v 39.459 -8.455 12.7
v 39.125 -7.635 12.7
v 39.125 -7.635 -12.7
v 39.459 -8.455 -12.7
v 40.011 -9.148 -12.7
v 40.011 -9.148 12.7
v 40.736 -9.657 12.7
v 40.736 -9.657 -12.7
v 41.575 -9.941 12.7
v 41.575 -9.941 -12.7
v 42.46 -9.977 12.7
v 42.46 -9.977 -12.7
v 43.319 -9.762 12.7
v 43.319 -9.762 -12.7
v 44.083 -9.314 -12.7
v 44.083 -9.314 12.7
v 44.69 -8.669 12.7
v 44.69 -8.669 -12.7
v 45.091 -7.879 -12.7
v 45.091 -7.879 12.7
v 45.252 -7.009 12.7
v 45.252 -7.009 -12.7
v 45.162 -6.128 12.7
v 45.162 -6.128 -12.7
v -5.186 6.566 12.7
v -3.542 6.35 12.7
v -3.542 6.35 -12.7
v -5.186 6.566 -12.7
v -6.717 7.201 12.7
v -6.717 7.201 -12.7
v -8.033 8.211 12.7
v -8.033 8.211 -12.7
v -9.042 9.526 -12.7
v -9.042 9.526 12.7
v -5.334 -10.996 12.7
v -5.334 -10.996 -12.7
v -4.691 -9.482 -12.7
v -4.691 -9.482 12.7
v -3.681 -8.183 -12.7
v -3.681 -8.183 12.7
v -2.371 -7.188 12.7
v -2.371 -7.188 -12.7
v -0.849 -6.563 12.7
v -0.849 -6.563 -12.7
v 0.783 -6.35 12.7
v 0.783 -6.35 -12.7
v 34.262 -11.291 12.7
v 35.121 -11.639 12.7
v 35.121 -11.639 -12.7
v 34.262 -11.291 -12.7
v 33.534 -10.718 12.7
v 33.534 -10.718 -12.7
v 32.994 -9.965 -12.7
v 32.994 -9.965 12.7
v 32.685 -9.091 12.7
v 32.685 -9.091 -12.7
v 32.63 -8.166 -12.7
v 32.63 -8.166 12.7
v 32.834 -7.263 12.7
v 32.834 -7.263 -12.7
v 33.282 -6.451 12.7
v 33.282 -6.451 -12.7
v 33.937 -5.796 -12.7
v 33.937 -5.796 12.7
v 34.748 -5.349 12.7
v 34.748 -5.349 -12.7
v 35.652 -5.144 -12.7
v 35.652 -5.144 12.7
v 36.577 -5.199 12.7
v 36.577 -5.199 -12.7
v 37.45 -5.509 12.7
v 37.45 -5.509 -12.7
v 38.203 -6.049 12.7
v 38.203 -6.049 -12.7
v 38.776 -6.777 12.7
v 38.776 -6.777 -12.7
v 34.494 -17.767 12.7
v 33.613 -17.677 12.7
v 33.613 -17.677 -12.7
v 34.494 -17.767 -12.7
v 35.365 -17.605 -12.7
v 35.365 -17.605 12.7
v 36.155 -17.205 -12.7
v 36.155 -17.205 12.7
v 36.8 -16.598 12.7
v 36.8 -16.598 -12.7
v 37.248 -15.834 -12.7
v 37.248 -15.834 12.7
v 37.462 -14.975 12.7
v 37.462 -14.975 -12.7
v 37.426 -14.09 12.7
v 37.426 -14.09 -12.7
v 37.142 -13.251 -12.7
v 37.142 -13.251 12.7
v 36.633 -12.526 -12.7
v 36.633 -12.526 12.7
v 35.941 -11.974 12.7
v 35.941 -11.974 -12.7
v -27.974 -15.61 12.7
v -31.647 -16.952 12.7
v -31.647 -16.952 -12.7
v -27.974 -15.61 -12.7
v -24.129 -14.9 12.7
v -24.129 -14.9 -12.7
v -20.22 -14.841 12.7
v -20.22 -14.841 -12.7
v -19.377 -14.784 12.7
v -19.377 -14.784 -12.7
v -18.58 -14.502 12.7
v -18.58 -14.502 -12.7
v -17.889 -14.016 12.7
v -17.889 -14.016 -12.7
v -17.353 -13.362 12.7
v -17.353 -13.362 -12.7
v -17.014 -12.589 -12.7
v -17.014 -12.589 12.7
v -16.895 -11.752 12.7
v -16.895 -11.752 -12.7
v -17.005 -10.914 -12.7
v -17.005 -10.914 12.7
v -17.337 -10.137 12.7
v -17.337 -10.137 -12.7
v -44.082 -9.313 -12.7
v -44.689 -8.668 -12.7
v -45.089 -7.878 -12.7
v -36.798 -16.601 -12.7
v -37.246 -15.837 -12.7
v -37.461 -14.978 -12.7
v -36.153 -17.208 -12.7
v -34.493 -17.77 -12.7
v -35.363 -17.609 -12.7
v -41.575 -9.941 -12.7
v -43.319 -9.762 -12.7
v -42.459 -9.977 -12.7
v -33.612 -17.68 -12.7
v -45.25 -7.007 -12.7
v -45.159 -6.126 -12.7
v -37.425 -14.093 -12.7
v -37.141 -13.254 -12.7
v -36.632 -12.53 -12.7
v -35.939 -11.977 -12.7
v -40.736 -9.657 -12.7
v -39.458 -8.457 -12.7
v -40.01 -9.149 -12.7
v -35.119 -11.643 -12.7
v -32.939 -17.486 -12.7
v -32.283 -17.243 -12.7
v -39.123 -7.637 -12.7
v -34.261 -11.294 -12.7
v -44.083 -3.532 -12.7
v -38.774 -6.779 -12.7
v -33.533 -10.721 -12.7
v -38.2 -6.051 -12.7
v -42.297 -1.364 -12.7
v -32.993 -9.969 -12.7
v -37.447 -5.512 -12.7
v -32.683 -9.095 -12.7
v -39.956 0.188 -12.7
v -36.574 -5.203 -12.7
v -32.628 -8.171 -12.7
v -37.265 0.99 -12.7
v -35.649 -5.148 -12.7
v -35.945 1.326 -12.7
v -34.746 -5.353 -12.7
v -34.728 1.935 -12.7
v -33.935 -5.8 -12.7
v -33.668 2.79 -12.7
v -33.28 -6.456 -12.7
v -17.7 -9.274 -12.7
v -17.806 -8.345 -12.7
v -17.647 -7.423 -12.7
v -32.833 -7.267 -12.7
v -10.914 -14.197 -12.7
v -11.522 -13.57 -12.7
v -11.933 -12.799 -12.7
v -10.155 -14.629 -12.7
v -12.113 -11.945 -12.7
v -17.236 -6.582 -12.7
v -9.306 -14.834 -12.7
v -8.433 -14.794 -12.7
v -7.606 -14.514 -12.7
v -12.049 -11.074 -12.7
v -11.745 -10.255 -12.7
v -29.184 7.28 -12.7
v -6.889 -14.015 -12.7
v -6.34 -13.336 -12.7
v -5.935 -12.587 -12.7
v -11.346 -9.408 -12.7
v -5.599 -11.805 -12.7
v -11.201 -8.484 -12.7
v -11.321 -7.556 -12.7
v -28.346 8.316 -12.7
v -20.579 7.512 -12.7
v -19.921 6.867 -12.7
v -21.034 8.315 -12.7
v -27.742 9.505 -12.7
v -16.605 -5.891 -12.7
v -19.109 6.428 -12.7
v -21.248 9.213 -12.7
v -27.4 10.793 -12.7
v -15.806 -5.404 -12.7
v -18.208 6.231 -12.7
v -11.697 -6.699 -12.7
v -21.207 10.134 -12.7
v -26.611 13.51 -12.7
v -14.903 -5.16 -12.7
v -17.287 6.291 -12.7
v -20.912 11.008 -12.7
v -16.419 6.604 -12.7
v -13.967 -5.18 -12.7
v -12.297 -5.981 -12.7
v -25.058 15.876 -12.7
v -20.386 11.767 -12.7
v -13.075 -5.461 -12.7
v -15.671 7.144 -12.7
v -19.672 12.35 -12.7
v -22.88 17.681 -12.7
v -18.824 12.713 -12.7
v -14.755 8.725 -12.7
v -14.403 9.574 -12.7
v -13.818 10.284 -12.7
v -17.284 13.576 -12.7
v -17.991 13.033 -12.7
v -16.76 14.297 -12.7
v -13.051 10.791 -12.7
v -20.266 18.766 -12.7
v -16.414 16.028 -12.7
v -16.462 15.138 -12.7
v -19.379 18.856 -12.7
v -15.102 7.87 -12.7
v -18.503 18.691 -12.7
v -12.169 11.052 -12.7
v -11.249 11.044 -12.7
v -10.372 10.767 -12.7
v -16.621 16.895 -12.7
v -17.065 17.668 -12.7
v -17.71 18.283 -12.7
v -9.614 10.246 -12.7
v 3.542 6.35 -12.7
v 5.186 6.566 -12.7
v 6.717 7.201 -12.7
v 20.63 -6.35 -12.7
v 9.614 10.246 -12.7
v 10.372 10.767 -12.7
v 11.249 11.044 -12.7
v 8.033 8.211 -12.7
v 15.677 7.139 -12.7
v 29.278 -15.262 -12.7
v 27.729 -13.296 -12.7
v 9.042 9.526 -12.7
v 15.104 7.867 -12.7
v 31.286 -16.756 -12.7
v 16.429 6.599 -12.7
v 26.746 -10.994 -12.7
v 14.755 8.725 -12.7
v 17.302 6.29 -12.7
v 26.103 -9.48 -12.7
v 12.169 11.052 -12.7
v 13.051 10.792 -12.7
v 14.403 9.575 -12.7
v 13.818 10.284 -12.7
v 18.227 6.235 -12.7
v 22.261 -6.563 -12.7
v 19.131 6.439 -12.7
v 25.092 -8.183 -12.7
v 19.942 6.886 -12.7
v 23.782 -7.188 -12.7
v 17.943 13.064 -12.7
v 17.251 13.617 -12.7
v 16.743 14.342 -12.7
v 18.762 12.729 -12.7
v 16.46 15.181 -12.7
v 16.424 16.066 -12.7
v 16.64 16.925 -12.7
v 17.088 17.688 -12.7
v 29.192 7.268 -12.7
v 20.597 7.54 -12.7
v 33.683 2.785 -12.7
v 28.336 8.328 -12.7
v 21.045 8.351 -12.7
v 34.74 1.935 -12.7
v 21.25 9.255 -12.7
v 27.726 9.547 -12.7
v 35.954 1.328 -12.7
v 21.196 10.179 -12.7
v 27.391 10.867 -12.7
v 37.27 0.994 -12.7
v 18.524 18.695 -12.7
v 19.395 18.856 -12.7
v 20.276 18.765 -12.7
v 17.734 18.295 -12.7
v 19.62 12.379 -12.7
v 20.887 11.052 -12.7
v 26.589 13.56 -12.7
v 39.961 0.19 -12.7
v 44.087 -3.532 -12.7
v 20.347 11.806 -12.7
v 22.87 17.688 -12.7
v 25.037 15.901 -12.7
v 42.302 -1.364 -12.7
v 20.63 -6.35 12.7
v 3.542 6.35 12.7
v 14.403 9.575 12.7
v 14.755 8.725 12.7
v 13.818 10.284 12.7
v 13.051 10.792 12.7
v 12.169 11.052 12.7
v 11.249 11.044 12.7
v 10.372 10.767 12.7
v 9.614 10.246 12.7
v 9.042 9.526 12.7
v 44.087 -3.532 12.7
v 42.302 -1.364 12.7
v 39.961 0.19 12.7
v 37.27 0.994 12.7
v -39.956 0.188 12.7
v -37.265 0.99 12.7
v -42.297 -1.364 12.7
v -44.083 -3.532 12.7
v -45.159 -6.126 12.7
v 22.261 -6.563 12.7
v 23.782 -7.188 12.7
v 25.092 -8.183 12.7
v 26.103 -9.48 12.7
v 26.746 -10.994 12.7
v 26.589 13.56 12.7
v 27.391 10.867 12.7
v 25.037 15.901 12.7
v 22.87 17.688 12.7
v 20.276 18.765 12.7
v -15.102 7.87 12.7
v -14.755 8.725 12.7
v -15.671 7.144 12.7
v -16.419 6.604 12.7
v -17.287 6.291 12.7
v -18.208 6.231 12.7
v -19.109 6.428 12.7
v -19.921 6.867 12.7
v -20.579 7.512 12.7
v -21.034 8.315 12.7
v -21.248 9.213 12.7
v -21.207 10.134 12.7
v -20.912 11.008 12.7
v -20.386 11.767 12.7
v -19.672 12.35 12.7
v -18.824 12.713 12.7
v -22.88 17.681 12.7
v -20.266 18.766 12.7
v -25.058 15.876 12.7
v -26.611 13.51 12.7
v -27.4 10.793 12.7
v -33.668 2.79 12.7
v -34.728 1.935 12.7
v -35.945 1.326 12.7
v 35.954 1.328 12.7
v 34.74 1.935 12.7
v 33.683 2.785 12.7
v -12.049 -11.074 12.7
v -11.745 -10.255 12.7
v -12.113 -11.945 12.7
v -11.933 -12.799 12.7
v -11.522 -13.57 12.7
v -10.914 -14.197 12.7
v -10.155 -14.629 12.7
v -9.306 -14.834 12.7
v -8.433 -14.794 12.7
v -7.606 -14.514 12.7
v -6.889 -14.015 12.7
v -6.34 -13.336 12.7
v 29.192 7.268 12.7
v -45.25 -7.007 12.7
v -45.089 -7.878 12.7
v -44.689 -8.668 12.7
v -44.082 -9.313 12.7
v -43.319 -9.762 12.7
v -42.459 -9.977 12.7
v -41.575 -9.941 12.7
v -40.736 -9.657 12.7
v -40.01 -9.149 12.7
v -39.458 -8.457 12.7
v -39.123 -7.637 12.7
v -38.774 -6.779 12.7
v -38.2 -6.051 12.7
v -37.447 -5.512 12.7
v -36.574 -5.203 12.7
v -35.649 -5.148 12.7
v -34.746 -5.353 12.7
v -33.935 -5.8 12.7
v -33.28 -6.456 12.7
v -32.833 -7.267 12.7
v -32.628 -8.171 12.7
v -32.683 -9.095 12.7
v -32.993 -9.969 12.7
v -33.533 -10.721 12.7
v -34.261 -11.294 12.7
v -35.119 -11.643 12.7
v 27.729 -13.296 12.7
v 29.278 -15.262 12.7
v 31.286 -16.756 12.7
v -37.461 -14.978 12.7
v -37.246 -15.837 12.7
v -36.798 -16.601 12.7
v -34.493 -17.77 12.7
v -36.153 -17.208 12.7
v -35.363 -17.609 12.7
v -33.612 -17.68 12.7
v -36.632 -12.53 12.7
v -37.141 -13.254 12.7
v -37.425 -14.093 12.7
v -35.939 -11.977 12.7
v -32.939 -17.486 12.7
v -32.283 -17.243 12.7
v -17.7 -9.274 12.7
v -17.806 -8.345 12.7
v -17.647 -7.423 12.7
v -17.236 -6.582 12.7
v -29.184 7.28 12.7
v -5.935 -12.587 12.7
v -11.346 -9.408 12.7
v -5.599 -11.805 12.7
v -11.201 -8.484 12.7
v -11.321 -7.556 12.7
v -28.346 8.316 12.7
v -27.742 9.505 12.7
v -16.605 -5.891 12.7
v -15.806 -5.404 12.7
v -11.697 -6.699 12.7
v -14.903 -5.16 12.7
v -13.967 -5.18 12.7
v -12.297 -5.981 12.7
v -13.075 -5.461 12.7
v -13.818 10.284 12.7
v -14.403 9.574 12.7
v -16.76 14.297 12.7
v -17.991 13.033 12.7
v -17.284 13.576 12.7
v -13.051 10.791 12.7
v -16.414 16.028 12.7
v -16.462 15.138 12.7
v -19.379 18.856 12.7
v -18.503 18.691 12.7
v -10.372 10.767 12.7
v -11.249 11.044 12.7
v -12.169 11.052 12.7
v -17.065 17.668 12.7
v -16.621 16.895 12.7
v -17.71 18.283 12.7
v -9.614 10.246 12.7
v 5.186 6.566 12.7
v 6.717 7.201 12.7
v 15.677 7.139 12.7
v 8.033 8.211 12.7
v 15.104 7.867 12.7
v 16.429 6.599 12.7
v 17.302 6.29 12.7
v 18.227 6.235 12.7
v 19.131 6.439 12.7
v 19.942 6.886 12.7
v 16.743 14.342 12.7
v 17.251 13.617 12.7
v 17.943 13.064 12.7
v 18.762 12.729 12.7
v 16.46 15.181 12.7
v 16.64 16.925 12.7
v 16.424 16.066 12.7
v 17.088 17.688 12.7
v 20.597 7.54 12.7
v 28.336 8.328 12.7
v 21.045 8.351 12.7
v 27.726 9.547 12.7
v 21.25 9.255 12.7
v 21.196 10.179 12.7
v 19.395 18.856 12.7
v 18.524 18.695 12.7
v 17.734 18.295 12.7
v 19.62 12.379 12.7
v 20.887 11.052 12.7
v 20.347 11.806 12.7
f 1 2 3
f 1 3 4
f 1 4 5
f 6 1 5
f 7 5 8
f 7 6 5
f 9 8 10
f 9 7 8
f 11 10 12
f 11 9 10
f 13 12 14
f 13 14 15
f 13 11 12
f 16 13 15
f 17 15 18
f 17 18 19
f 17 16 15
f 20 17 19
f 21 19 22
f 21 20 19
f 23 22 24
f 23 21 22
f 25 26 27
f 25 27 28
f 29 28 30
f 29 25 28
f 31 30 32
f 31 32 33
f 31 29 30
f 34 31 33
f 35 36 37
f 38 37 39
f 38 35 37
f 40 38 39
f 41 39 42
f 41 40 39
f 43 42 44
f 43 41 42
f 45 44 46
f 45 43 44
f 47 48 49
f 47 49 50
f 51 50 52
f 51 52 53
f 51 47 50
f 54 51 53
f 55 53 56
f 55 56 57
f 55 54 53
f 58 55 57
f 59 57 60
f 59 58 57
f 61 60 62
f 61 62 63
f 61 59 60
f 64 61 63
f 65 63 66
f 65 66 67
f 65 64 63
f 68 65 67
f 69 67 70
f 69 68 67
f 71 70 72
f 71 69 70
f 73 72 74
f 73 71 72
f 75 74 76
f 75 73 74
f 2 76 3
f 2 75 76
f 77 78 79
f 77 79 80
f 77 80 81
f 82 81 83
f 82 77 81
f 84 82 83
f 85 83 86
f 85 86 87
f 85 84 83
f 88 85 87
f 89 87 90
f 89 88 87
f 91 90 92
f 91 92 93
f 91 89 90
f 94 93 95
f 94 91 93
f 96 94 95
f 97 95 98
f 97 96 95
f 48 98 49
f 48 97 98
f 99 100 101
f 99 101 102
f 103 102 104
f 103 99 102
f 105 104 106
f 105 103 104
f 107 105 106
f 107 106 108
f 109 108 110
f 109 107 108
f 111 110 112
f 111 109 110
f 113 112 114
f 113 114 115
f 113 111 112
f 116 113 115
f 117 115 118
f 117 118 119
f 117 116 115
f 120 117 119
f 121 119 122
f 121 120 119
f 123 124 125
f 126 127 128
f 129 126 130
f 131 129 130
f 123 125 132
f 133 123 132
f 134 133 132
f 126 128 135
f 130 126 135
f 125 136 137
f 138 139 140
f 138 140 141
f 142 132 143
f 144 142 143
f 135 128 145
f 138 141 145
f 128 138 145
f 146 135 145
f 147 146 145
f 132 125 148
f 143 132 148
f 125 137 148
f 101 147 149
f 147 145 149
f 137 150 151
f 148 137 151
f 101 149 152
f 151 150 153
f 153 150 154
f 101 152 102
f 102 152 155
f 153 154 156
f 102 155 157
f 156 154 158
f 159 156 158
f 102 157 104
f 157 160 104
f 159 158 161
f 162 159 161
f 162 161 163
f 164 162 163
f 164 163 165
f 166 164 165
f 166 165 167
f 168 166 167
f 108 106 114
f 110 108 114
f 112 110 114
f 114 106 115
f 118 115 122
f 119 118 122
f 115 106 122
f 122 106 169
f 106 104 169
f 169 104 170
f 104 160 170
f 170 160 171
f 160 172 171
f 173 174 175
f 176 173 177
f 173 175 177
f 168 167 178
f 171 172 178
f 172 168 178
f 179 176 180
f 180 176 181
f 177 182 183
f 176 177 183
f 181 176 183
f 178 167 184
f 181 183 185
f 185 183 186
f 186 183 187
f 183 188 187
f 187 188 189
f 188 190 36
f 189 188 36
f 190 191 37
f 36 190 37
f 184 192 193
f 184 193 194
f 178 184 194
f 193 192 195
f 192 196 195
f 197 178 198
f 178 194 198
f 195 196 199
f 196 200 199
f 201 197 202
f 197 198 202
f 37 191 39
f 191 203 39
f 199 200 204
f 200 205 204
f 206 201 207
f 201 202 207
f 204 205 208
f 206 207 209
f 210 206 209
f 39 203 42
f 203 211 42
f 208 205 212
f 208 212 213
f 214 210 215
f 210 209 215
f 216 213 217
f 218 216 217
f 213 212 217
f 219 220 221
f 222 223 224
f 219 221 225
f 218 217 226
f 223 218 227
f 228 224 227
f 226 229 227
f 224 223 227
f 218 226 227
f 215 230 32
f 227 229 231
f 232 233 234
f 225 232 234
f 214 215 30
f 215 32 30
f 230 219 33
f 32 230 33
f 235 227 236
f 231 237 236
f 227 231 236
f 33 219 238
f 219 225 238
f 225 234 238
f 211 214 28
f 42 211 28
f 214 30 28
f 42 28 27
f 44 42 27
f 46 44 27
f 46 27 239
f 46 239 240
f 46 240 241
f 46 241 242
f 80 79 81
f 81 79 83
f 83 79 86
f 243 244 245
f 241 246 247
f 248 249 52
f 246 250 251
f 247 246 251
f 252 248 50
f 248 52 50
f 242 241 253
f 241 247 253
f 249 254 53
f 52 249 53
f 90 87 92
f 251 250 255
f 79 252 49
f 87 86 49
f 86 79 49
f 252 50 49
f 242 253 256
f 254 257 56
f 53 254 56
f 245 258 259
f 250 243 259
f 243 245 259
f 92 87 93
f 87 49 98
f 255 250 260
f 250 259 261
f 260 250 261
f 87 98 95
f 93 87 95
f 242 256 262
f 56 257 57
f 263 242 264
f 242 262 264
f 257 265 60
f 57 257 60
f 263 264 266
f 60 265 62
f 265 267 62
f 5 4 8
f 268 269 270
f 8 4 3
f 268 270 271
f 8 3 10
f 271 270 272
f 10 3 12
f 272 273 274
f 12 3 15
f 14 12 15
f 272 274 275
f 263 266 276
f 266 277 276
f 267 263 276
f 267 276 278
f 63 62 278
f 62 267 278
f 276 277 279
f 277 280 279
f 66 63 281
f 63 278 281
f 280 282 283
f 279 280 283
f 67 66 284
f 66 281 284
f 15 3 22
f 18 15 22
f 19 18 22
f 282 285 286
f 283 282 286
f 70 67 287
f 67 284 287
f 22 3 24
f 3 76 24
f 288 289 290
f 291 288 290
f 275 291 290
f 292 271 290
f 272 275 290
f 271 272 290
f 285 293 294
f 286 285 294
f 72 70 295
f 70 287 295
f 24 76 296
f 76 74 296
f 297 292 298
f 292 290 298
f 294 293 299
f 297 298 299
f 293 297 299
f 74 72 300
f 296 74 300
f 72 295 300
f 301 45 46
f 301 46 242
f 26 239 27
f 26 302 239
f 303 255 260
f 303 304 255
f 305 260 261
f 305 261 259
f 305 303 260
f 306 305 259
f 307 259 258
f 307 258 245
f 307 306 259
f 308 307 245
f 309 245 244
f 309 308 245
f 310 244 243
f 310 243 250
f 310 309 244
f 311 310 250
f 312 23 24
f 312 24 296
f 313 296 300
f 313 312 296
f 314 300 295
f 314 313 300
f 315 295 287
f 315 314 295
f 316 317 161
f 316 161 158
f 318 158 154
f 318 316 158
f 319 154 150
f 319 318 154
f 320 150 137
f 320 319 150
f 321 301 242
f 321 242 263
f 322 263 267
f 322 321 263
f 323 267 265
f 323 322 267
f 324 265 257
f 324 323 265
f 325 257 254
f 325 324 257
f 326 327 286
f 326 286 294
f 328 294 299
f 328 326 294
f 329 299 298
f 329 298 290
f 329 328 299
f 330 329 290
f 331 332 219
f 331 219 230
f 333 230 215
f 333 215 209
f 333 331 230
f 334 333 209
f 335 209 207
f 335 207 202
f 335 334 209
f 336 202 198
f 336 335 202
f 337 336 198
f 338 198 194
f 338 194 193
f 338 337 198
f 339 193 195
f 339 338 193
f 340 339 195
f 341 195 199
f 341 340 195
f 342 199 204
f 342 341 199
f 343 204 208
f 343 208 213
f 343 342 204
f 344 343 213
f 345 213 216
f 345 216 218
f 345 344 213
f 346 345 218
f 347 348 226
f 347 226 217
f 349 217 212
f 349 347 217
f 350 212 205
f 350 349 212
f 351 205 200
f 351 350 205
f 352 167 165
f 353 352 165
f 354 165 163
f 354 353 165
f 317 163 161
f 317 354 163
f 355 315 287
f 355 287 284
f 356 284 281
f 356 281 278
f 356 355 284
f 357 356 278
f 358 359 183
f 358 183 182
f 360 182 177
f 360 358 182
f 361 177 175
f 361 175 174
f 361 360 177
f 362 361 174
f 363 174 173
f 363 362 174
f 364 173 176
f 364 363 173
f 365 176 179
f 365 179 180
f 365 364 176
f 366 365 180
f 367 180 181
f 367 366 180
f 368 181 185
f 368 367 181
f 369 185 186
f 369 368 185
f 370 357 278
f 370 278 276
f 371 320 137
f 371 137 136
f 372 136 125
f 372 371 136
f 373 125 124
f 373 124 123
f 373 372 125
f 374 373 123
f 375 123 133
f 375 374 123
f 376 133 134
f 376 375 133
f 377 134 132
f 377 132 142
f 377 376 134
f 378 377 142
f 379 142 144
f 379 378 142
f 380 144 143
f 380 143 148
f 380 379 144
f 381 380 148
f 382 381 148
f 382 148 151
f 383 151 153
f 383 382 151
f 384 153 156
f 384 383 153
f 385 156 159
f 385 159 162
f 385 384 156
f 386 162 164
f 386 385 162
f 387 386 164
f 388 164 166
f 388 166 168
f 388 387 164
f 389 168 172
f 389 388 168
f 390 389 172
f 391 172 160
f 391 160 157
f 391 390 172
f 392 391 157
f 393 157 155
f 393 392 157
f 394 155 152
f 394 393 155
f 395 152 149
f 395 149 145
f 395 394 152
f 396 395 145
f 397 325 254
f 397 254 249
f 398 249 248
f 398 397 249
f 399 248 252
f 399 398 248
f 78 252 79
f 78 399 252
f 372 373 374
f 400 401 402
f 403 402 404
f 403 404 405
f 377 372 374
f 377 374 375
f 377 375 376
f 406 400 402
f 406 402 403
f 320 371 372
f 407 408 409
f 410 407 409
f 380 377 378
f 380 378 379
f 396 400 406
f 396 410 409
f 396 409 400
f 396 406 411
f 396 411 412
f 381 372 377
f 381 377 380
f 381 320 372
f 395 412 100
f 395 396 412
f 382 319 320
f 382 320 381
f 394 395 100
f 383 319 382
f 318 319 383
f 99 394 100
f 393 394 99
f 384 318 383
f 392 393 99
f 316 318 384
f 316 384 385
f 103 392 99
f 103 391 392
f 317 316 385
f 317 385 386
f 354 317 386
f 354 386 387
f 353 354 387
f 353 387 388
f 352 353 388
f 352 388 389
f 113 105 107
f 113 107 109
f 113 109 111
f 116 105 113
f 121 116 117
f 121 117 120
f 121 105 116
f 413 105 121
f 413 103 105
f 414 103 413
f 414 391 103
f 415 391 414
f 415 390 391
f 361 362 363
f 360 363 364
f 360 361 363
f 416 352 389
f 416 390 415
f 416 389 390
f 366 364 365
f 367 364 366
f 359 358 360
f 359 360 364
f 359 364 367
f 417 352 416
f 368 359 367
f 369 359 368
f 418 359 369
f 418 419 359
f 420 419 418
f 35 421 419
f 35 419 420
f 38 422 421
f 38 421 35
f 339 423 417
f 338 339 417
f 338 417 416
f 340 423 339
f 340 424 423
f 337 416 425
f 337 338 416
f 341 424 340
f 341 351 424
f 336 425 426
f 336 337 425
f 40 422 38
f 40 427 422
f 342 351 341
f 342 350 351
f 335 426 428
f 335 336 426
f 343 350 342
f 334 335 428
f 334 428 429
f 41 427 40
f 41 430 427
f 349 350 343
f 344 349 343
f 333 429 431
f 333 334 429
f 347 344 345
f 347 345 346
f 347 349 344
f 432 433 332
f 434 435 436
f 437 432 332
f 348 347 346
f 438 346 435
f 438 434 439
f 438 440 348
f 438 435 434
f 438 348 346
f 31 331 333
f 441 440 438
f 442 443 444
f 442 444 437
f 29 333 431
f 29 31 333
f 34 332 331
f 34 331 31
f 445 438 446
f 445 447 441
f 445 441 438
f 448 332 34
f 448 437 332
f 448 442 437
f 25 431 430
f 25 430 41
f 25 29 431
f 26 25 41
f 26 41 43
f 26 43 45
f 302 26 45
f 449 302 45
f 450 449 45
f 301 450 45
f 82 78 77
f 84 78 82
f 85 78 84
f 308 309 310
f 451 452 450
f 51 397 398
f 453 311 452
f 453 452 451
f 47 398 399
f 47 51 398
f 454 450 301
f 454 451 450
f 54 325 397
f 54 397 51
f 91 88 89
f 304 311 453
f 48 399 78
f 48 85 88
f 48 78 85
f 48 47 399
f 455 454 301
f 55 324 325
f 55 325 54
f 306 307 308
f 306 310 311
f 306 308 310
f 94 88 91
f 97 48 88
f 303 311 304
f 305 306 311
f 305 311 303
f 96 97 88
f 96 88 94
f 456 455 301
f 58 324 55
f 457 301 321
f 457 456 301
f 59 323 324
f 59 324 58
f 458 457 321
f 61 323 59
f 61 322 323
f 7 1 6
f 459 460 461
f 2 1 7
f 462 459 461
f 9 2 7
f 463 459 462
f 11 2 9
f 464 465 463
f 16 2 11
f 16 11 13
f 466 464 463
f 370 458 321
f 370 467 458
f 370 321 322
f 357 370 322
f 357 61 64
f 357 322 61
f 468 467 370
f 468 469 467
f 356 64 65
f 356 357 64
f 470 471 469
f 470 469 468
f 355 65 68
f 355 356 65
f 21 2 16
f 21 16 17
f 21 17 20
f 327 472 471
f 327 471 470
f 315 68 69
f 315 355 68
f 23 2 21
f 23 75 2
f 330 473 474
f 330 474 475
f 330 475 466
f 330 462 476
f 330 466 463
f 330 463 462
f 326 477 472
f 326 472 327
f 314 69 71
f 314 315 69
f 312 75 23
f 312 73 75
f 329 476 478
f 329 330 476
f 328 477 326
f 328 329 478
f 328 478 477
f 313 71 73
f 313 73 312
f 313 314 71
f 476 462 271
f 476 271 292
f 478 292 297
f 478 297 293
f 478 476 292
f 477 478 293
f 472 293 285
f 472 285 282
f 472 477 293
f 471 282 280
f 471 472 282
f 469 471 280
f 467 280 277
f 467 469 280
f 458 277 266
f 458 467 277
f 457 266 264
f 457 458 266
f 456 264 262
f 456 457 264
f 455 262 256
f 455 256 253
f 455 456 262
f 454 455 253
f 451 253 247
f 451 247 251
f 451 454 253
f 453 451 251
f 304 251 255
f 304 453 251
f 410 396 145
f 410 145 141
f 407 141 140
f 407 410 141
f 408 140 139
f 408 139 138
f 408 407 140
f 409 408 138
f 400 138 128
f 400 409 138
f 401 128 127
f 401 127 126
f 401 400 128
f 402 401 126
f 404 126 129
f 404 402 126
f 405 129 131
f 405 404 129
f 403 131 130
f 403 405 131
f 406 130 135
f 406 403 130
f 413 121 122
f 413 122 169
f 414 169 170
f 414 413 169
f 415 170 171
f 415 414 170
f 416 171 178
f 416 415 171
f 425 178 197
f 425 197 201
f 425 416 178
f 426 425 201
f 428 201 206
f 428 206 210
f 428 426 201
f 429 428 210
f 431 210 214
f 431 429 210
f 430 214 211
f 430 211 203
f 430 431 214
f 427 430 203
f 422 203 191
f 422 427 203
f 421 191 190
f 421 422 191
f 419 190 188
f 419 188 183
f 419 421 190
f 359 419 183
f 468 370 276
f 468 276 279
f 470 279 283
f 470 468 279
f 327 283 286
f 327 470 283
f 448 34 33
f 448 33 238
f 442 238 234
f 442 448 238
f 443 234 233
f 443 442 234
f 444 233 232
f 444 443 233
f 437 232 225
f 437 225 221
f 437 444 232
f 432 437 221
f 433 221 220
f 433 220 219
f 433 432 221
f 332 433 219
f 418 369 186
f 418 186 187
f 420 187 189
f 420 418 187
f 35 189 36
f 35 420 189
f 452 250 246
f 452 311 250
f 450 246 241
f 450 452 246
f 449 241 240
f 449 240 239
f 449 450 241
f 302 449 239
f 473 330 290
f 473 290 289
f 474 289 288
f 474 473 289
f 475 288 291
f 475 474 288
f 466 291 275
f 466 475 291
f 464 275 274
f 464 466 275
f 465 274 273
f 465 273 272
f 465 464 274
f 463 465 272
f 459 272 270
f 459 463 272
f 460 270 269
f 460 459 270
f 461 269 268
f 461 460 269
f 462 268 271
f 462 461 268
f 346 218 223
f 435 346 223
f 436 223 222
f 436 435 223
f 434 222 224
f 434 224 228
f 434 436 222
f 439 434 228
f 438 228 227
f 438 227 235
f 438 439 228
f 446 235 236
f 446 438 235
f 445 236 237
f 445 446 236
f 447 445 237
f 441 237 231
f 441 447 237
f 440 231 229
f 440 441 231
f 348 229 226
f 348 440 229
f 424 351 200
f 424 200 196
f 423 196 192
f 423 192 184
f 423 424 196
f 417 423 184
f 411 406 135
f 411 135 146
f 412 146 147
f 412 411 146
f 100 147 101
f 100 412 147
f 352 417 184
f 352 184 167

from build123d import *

# Parameters (mm, degrees)
EXTRUDE1_DEPTH = 12.7


with BuildPart() as part:
    # Sketch1 → Extrude1 (new body, symmetric)
    with BuildSketch(Plane.XY):
        with BuildLine():
            Line((3.541744722, 6.350000317), (-3.541744722, 6.350000317))
            ThreePointArc((-3.541744722, 6.350000317), (-6.717339471, 7.201082424), (-9.041692685, 9.526189926))
            ThreePointArc((-9.041692685, 9.526189926), (-12.168838665, 11.052363462), (-14.755482048, 8.724806019))
            ThreePointArc((-14.755482048, 8.724806019), (-20.272604103, 7.166406874), (-18.823535008, 12.713247635))
            ThreePointArc((-18.823535008, 12.713247635), (-16.4863366, 16.468880196), (-20.266433142, 18.766301026))
            ThreePointArc((-20.266433142, 18.766301026), (-25.058481671, 15.875940516), (-27.400098665, 10.793151634))
            ThreePointArc((-27.400098665, 10.793151634), (-28.012836895, 8.894644494), (-29.184374008, 7.27993762))
            Line((-29.184374008, 7.27993762), (-33.668197009, 2.789809368))
            ThreePointArc((-33.668197009, 2.789809368), (-35.320246571, 1.597881998), (-37.264713426, 0.990422317))
            ThreePointArc((-37.264713426, 0.990422317), (-42.296938103, -1.364178798), (-45.159399664, -6.125874443))
            ThreePointArc((-45.159399664, -6.125874443), (-42.896712959, -9.899879208), (-39.1227081, -7.637192526))
            ThreePointArc((-39.1227081, -7.637192526), (-33.584022437, -6.104926504), (-35.119498005, -11.642723169))
            ThreePointArc((-35.119498005, -11.642723169), (-37.384371438, -15.415416021), (-33.611678586, -17.680289454))
            ThreePointArc((-33.611678586, -17.680289454), (-32.609025986, -17.370294909), (-31.646563329, -16.951875875))
            ThreePointArc((-31.646563329, -16.951875875), (-26.066681379, -15.174096844), (-20.21993522, -14.840719891))
            ThreePointArc((-20.21993522, -14.840719891), (-17.353189866, -13.362481197), (-17.337180754, -10.137087846))
            ThreePointArc((-17.337180754, -10.137087846), (-14.434495922, -5.136768789), (-11.74460461, -10.254703395))
            ThreePointArc((-11.74460461, -10.254703395), (-10.54959622, -14.439704472), (-6.339625545, -13.335881127))
            ThreePointArc((-6.339625545, -13.335881127), (-5.758478435, -12.199696418), (-5.334434584, -10.996021018))
            ThreePointArc((-5.334434584, -10.996021018), (-3.058049309, -7.643184473), (0.782668949, -6.35))
            Line((0.782668949, -6.35), (20.629531136, -6.35))
            ThreePointArc((20.629531136, -6.35), (24.469498585, -7.642614313), (26.746128433, -10.994204727))
            ThreePointArc((26.746128433, -10.994204727), (29.278173872, -15.26179643), (33.613137194, -17.676684799))
            ThreePointArc((33.613137194, -17.676684799), (37.385829768, -15.411811583), (35.120956636, -11.639118675))
            ThreePointArc((35.120956636, -11.639118675), (33.586157492, -6.100645238), (39.124630957, -7.635444299))
            ThreePointArc((39.124630957, -7.635444299), (42.897323989, -9.900317715), (45.162197311, -6.127624707))
            ThreePointArc((45.162197311, -6.127624707), (42.301720517, -1.363571666), (37.269569316, 0.993541642))
            ThreePointArc((37.269569316, 0.993541642), (35.33100147, 1.598861028), (33.682682253, 2.785242337))
            Line((33.682682253, 2.785242337), (29.191501523, 7.268011131))
            ThreePointArc((29.191501523, 7.268011131), (27.998435311, 8.921281589), (27.390796294, 10.867427785))
            ThreePointArc((27.390796294, 10.867427785), (25.0373104, 15.90083737), (20.275755297, 18.764698607))
            ThreePointArc((20.275755297, 18.764698607), (16.501386803, 16.503215052), (18.762343911, 12.728531392))
            ThreePointArc((18.762343911, 12.728531392), (20.292630817, 7.189814806), (14.755356019, 8.725310571))
            ThreePointArc((14.755356019, 8.725310571), (12.168581157, 11.052399567), (9.041692685, 9.526189926))
            ThreePointArc((9.041692685, 9.526189926), (6.717339471, 7.201082424), (3.541744722, 6.350000317))
        make_face()
    extrude(amount=EXTRUDE1_DEPTH, both=True)


solid = part.part
